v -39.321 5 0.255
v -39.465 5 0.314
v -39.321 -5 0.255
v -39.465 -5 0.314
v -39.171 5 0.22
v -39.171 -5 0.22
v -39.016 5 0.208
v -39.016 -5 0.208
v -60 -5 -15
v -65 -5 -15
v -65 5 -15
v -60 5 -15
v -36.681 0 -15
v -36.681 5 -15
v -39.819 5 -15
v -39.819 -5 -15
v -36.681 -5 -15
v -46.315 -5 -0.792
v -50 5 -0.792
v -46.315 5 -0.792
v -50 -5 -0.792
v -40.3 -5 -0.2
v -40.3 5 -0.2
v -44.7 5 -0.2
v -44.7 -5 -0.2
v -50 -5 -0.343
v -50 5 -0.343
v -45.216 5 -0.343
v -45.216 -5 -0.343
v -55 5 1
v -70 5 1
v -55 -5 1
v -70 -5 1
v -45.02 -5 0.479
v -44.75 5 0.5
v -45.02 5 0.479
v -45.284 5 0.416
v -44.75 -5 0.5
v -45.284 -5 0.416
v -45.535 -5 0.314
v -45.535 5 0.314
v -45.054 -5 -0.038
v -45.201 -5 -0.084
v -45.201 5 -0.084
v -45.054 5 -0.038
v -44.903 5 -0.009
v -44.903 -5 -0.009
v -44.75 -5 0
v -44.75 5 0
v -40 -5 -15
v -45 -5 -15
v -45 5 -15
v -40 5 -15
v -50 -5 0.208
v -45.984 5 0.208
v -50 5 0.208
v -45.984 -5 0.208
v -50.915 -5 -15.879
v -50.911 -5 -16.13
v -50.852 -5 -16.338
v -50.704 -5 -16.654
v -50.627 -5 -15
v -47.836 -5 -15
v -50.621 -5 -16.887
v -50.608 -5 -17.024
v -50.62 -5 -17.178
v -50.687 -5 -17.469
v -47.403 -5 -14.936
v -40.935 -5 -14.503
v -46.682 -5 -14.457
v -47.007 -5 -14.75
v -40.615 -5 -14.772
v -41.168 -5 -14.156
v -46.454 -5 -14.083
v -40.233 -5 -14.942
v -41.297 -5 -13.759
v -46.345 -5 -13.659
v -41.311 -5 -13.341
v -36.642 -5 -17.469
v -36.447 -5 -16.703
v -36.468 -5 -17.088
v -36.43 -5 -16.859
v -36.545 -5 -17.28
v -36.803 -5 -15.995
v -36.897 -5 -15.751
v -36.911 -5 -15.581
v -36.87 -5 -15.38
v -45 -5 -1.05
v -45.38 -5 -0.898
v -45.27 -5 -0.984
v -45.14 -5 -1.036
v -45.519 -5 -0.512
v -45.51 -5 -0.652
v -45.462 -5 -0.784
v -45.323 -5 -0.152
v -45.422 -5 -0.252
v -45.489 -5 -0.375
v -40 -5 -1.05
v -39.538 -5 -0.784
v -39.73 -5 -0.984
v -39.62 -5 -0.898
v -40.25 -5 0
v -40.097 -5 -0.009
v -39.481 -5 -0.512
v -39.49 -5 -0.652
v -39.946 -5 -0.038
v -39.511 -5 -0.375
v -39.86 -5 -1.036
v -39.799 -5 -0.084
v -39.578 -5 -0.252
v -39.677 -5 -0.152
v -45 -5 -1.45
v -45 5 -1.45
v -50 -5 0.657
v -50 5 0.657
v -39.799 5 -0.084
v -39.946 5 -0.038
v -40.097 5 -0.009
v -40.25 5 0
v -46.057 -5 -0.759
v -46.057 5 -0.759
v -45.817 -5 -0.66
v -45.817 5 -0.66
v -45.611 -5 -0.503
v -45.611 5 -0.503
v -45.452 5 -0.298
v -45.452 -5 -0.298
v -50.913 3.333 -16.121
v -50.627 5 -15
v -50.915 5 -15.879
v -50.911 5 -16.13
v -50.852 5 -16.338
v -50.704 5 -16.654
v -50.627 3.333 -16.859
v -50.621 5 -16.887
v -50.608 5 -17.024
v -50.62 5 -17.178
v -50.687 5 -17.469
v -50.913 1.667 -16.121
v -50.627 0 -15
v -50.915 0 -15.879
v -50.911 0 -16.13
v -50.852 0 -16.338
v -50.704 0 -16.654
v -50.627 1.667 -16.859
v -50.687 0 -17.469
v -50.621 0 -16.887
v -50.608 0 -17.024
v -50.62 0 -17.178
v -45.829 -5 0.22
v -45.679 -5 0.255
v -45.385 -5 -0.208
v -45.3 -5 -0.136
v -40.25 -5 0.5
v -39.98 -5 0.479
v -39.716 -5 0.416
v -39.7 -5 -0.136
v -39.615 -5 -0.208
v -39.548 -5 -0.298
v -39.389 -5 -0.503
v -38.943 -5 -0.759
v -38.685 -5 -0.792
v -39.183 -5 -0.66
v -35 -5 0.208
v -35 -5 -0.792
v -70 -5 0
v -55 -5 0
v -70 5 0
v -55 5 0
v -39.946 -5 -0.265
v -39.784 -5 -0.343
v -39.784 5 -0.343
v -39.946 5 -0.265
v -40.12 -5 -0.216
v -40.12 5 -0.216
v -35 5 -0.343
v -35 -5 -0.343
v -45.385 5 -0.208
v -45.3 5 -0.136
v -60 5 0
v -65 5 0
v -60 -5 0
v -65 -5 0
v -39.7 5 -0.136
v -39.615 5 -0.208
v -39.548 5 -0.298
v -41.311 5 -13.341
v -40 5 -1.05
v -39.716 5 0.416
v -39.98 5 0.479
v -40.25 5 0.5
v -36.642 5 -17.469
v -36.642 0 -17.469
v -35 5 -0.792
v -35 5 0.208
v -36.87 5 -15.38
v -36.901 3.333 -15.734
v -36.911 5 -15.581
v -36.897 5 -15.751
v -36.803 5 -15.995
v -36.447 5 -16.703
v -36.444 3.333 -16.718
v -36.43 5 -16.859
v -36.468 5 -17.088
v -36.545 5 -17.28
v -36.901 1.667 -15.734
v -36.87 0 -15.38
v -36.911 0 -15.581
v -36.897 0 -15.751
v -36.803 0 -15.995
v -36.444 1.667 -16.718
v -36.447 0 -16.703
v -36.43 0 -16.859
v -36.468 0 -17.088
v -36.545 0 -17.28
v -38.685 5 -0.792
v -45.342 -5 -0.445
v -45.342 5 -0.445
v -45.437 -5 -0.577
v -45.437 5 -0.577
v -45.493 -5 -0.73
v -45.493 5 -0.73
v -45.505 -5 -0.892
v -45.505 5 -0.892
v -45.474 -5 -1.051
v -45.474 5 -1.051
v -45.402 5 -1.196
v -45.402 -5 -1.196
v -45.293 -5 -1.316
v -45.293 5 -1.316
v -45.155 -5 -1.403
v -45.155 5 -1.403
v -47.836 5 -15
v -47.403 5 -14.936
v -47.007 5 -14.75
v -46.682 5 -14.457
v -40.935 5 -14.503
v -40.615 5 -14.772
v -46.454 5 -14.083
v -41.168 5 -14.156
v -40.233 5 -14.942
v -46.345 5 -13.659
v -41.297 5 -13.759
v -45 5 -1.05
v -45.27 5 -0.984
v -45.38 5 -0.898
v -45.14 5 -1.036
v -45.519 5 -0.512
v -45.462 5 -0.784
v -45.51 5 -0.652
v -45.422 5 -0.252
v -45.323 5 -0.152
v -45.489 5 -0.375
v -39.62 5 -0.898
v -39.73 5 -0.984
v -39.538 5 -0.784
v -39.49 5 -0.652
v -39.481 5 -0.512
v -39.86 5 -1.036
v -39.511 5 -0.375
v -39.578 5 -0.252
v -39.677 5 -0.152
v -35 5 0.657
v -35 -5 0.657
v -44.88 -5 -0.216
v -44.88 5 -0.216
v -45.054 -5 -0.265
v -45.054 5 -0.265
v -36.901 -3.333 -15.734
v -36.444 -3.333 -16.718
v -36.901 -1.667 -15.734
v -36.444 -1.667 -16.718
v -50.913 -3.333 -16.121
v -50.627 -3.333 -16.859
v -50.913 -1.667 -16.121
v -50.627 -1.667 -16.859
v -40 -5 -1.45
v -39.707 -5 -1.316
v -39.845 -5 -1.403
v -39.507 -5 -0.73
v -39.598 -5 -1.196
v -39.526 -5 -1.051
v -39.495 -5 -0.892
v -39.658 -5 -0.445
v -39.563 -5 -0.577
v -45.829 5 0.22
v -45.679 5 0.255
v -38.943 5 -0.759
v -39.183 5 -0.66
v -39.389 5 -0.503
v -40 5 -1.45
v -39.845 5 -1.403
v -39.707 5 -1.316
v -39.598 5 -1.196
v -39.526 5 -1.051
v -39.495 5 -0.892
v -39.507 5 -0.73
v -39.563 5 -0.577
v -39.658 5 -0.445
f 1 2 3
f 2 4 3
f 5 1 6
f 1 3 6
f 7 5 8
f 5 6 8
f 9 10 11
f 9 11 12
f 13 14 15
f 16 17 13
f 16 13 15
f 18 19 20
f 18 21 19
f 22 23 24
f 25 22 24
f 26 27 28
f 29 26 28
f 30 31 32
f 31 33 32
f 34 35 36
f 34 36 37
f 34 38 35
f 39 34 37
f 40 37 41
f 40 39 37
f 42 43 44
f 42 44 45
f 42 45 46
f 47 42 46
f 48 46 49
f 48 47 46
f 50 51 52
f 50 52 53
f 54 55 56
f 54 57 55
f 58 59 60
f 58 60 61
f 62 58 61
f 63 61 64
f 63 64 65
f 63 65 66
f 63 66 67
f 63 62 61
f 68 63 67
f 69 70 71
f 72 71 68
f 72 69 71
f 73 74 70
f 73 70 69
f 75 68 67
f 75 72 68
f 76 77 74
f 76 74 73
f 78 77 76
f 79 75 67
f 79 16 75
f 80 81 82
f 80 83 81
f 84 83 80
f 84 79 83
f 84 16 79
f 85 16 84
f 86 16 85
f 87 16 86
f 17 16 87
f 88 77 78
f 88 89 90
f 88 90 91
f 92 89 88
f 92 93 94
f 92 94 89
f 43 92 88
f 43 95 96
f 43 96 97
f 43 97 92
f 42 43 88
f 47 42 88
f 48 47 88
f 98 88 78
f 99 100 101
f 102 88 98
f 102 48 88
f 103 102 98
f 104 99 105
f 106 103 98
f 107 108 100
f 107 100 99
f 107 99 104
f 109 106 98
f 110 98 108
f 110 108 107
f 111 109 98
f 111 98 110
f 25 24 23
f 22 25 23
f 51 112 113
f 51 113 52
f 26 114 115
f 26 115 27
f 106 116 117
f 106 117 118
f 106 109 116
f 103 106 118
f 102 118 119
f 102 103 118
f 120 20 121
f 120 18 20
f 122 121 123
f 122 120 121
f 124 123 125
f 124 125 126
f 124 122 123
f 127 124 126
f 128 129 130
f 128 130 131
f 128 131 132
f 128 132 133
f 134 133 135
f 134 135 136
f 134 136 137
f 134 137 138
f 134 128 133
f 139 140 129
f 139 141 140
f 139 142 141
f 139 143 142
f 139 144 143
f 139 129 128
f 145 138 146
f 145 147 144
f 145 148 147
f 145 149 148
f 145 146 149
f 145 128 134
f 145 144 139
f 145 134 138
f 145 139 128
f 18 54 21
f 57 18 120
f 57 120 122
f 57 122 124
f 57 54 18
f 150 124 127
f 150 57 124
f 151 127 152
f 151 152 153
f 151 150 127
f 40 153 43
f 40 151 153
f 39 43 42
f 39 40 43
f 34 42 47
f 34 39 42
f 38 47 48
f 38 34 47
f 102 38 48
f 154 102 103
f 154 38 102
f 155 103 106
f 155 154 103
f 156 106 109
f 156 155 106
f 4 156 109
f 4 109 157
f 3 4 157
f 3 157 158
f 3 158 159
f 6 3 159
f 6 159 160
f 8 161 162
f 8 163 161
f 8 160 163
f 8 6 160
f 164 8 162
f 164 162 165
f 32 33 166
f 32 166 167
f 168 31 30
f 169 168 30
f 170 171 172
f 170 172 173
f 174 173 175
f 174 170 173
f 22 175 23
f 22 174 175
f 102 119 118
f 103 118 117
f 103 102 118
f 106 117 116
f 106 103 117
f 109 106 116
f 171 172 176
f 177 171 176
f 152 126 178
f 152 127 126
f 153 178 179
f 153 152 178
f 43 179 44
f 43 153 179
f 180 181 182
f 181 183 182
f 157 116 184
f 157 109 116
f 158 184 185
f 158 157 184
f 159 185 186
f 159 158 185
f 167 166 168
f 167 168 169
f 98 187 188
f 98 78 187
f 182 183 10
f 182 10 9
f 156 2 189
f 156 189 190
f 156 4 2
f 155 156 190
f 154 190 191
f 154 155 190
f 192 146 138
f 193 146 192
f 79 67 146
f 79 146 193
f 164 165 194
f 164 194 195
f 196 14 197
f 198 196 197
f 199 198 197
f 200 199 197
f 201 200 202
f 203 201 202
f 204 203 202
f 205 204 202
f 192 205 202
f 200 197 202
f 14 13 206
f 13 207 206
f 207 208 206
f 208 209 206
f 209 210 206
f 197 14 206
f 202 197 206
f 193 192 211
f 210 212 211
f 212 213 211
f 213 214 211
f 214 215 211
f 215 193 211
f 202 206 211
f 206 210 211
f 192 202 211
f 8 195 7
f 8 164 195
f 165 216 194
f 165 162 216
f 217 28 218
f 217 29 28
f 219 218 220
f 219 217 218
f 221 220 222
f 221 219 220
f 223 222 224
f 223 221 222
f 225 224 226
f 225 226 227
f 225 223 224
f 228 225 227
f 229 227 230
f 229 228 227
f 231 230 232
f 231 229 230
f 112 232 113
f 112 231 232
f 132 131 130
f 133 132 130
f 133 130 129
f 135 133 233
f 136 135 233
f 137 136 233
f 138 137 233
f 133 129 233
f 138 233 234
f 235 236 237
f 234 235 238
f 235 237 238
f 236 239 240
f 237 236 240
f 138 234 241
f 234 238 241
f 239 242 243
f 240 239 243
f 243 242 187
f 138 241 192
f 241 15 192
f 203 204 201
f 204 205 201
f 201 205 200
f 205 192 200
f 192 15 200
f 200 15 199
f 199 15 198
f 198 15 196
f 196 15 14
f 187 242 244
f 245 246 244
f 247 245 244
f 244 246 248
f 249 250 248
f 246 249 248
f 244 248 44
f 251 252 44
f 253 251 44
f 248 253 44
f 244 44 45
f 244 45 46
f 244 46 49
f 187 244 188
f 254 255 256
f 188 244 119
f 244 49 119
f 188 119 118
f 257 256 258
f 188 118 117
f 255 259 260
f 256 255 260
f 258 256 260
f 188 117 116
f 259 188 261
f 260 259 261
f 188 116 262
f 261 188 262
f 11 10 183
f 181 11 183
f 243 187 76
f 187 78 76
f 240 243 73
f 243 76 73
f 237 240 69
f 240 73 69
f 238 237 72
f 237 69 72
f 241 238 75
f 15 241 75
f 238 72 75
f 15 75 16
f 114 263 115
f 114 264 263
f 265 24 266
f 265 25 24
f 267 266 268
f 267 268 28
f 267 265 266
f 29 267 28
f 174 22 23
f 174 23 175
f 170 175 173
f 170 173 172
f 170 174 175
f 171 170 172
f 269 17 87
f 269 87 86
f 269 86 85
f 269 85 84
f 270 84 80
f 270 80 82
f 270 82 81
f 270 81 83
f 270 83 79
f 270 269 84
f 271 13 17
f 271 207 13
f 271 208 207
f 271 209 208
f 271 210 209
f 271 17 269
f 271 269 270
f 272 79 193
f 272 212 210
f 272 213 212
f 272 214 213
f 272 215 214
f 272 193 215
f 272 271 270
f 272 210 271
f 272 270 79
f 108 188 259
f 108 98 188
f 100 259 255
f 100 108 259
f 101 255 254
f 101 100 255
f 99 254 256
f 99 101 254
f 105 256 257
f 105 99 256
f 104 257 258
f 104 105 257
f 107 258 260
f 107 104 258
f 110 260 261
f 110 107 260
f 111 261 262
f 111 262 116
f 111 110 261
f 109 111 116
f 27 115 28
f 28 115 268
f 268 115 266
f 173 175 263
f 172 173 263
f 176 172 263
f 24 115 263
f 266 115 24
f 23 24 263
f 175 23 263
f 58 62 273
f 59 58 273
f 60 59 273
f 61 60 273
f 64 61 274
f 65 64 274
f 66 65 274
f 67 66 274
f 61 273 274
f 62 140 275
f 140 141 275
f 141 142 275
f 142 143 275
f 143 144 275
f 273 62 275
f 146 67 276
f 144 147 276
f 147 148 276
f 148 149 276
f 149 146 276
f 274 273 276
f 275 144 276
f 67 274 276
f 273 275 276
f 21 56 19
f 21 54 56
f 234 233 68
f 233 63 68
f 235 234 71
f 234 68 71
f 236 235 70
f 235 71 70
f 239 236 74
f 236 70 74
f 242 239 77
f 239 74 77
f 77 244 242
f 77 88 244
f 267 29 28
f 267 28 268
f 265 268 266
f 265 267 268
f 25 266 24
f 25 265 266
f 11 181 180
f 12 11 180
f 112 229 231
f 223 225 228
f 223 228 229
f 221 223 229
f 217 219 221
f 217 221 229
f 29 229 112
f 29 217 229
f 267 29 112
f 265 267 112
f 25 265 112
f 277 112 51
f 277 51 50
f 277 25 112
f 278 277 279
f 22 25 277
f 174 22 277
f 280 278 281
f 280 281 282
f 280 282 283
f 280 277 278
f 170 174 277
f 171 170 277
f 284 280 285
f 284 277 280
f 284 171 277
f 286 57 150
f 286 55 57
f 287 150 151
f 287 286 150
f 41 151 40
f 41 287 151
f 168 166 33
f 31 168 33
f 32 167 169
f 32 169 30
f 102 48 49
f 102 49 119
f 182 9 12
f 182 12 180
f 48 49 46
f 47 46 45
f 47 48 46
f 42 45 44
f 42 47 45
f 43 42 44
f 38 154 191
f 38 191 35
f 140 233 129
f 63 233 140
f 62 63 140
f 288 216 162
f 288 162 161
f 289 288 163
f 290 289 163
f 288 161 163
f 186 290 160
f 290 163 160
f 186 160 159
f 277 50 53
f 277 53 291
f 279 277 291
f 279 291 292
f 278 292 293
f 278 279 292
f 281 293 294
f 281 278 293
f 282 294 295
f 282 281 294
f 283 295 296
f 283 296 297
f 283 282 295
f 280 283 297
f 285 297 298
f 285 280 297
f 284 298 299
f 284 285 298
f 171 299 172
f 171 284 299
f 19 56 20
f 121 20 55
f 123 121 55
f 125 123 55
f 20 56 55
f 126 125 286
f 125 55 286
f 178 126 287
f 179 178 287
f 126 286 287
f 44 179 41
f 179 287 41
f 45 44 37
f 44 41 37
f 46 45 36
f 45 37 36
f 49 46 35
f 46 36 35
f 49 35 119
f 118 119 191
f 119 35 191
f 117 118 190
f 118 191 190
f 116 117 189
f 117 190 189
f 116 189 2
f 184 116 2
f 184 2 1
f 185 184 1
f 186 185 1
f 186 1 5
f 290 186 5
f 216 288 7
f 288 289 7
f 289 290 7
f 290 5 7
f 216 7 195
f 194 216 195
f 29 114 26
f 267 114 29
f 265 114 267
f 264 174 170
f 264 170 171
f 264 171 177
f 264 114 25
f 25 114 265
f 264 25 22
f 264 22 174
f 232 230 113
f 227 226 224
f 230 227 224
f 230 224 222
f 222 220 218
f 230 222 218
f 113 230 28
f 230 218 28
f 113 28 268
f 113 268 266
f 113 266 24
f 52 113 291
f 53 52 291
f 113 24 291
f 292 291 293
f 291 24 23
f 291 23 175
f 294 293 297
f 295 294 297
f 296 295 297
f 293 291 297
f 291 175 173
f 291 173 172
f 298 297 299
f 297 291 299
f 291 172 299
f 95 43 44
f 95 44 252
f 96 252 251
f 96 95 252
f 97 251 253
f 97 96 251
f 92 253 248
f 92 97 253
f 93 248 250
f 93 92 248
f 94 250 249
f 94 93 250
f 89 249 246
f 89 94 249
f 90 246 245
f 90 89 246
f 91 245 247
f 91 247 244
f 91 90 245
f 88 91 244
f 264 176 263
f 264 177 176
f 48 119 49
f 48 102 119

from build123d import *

# Parameters (mm, degrees)
F5_W      = 5
F5_H      = 15
F6_DEPTH  = 5
F7_W      = 15
F7_H      = 1
F8_DEPTH  = 5
F10_DEPTH = 5
F12_DEPTH = 5
F13_R     = 1
F14_R     = 1.5


with BuildPart() as f6:
    # F5 (on Front) → F6 (new body, symmetric)
    with BuildSketch(Plane.XZ):
        with Locations((-62.5, -7.5)):
            Rectangle(F5_W, F5_H)
    extrude(amount=F6_DEPTH, both=True)


with BuildPart() as f6b:
    # F5 (on Front) → F6, piece 2 (new body, symmetric)
    with BuildSketch(Plane.XZ):
        with BuildLine():
            ThreePointArc((-45.2159381819, -0.3433741818), (-45.4952685083, -0.9722616262), (-45, -1.45))
            Line((-45, -1.45), (-45, -15))
            Line((-45, -15), (-40, -15))
            Line((-40, -15), (-40, -1.45))
            ThreePointArc((-40, -1.45), (-39.5047314917, -0.9722616262), (-39.7840618181, -0.3433741818))
            ThreePointArc((-39.7840618181, -0.3433741818), (-40.0322555493, -0.2365100368), (-40.3, -0.2))
            Line((-40.3, -0.2), (-44.7, -0.2))
            ThreePointArc((-44.7, -0.2), (-44.9677444507, -0.2365100368), (-45.2159381819, -0.3433741818))
        make_face()
    extrude(amount=F6_DEPTH, both=True)


with BuildPart() as f8:
    # F7 (on Front) → F8 (new body, symmetric)
    with BuildSketch(Plane.XZ):
        with Locations((-62.5, 0.5)):
            Rectangle(F7_W, F7_H)
    extrude(amount=F8_DEPTH, both=True)


with BuildPart() as f8b:
    # F7 (on Front) → F8, piece 2 (new body, symmetric)
    with BuildSketch(Plane.XZ):
        with BuildLine():
            Line((-35, 0.6566258182), (-50, 0.6566258182))
            Line((-50, 0.6566258182), (-50, -0.3433741818))
            Line((-50, -0.3433741818), (-45.2159381819, -0.3433741818))
            ThreePointArc((-45.2159381819, -0.3433741818), (-44.9677444507, -0.2365100368), (-44.7, -0.2))
            Line((-44.7, -0.2), (-40.3, -0.2))
            ThreePointArc((-40.3, -0.2), (-40.0322555493, -0.2365100368), (-39.7840618181, -0.3433741818))
            Line((-39.7840618181, -0.3433741818), (-35, -0.3433741818))
            Line((-35, -0.3433741818), (-35, 0.6566258182))
        make_face()
    extrude(amount=F8_DEPTH, both=True)


with BuildPart() as f10:
    # F9 (on Front) → F10 (new body, symmetric)
    with BuildSketch(Plane.XZ):
        with BuildLine():
            Line((-40.25, 0), (-44.75, 0))
            ThreePointArc((-44.75, 0), (-44.9791594988, -0.0211851547), (-45.2005513505, -0.0840225214))
            ThreePointArc((-45.2005513505, -0.0840225214), (-45.509891127, -0.6520535457), (-45, -1.05))
            Line((-45, -1.05), (-46.4879758656, -15))
            Line((-46.4879758656, -15), (-50.6274402142, -15))
            add(Edge.make_bspline(
                [(-50.6274402142, -15), (-50.7947364996, -15.3942994532), (-51.1004502292, -16.1148340192), (-50.5169564586, -16.8319173185), (-50.6324987301, -17.2658232252), (-50.6865717471, -17.4688883126)],
                knots=[0, 0, 0, 0, 0.3913581203, 0.7151596359, 1, 1, 1, 1], degree=3))
            Line((-50.6865717471, -17.4688883126), (-36.6419702768, -17.4688883126))
            add(Edge.make_bspline(
                [(-36.6811295621, -15), (-36.8168513331, -15.2351602212), (-37.1141343472, -15.7502517856), (-36.2348468495, -16.7010428967), (-36.5140489091, -17.2276252723), (-36.6419702768, -17.4688883126)],
                knots=[0, 0, 0, 0, 0.3127968435, 0.6851457046, 1, 1, 1, 1], degree=3))
            Line((-36.6811295621, -15), (-41.4879758656, -15))
            Line((-41.4879758656, -15), (-40, -1.05))
            ThreePointArc((-40, -1.05), (-39.490108873, -0.6520535457), (-39.7994486495, -0.0840225214))
            ThreePointArc((-39.7994486495, -0.0840225214), (-40.0208405012, -0.0211851547), (-40.25, 0))
        make_face()
    extrude(amount=F10_DEPTH, both=True)

    # F14
    f14_edges = [f10.edges().sort_by_distance(p)[0] for p in [
        (-41.487976, 0, -15),
        (-46.487976, 0, -15),
    ]]
    fillet(f14_edges, radius=F14_R)


with BuildPart() as f12:
    # F11 (on Front) → F12 (new body, symmetric)
    with BuildSketch(Plane.XZ):
        with BuildLine():
            Line((-50, -0.792350733), (-45.4578995266, -0.792350733))
            ThreePointArc((-45.4578995266, -0.792350733), (-45.4902755998, -0.3796742531), (-45.2005513505, -0.0840225214))
            ThreePointArc((-45.2005513505, -0.0840225214), (-44.9791594988, -0.0211851547), (-44.75, 0))
            Line((-44.75, 0), (-40.25, 0))
            ThreePointArc((-40.25, 0), (-40.0208405012, -0.0211851547), (-39.7994486495, -0.0840225214))
            ThreePointArc((-39.7994486495, -0.0840225214), (-39.5097244002, -0.3796742531), (-39.5421004734, -0.792350733))
            Line((-39.5421004734, -0.792350733), (-35, -0.792350733))
            Line((-35, -0.792350733), (-35, 0.207649267))
            Line((-35, 0.207649267), (-39.2816206248, 0.207649267))
            ThreePointArc((-39.2816206248, 0.207649267), (-39.7442264426, 0.4253188081), (-40.25, 0.5))
            Line((-40.25, 0.5), (-44.75, 0.5))
            ThreePointArc((-44.75, 0.5), (-45.2557735574, 0.4253188081), (-45.7183793752, 0.207649267))
            Line((-45.7183793752, 0.207649267), (-50, 0.207649267))
            Line((-50, 0.207649267), (-50, -0.792350733))
        make_face()
    extrude(amount=F12_DEPTH, both=True)

    # F13
    f13_edges = [f12.edges().sort_by_distance(p)[0] for p in [
        (-45.4579, 0, -0.792351),
        (-39.5421, 0, -0.792351),
        (-45.718379, 0, 0.207649),
        (-39.281621, 0, 0.207649),
    ]]
    fillet(f13_edges, radius=F13_R)


solid = Compound([f6.part, f6b.part, f8.part, f8b.part, f10.part, f12.part])
